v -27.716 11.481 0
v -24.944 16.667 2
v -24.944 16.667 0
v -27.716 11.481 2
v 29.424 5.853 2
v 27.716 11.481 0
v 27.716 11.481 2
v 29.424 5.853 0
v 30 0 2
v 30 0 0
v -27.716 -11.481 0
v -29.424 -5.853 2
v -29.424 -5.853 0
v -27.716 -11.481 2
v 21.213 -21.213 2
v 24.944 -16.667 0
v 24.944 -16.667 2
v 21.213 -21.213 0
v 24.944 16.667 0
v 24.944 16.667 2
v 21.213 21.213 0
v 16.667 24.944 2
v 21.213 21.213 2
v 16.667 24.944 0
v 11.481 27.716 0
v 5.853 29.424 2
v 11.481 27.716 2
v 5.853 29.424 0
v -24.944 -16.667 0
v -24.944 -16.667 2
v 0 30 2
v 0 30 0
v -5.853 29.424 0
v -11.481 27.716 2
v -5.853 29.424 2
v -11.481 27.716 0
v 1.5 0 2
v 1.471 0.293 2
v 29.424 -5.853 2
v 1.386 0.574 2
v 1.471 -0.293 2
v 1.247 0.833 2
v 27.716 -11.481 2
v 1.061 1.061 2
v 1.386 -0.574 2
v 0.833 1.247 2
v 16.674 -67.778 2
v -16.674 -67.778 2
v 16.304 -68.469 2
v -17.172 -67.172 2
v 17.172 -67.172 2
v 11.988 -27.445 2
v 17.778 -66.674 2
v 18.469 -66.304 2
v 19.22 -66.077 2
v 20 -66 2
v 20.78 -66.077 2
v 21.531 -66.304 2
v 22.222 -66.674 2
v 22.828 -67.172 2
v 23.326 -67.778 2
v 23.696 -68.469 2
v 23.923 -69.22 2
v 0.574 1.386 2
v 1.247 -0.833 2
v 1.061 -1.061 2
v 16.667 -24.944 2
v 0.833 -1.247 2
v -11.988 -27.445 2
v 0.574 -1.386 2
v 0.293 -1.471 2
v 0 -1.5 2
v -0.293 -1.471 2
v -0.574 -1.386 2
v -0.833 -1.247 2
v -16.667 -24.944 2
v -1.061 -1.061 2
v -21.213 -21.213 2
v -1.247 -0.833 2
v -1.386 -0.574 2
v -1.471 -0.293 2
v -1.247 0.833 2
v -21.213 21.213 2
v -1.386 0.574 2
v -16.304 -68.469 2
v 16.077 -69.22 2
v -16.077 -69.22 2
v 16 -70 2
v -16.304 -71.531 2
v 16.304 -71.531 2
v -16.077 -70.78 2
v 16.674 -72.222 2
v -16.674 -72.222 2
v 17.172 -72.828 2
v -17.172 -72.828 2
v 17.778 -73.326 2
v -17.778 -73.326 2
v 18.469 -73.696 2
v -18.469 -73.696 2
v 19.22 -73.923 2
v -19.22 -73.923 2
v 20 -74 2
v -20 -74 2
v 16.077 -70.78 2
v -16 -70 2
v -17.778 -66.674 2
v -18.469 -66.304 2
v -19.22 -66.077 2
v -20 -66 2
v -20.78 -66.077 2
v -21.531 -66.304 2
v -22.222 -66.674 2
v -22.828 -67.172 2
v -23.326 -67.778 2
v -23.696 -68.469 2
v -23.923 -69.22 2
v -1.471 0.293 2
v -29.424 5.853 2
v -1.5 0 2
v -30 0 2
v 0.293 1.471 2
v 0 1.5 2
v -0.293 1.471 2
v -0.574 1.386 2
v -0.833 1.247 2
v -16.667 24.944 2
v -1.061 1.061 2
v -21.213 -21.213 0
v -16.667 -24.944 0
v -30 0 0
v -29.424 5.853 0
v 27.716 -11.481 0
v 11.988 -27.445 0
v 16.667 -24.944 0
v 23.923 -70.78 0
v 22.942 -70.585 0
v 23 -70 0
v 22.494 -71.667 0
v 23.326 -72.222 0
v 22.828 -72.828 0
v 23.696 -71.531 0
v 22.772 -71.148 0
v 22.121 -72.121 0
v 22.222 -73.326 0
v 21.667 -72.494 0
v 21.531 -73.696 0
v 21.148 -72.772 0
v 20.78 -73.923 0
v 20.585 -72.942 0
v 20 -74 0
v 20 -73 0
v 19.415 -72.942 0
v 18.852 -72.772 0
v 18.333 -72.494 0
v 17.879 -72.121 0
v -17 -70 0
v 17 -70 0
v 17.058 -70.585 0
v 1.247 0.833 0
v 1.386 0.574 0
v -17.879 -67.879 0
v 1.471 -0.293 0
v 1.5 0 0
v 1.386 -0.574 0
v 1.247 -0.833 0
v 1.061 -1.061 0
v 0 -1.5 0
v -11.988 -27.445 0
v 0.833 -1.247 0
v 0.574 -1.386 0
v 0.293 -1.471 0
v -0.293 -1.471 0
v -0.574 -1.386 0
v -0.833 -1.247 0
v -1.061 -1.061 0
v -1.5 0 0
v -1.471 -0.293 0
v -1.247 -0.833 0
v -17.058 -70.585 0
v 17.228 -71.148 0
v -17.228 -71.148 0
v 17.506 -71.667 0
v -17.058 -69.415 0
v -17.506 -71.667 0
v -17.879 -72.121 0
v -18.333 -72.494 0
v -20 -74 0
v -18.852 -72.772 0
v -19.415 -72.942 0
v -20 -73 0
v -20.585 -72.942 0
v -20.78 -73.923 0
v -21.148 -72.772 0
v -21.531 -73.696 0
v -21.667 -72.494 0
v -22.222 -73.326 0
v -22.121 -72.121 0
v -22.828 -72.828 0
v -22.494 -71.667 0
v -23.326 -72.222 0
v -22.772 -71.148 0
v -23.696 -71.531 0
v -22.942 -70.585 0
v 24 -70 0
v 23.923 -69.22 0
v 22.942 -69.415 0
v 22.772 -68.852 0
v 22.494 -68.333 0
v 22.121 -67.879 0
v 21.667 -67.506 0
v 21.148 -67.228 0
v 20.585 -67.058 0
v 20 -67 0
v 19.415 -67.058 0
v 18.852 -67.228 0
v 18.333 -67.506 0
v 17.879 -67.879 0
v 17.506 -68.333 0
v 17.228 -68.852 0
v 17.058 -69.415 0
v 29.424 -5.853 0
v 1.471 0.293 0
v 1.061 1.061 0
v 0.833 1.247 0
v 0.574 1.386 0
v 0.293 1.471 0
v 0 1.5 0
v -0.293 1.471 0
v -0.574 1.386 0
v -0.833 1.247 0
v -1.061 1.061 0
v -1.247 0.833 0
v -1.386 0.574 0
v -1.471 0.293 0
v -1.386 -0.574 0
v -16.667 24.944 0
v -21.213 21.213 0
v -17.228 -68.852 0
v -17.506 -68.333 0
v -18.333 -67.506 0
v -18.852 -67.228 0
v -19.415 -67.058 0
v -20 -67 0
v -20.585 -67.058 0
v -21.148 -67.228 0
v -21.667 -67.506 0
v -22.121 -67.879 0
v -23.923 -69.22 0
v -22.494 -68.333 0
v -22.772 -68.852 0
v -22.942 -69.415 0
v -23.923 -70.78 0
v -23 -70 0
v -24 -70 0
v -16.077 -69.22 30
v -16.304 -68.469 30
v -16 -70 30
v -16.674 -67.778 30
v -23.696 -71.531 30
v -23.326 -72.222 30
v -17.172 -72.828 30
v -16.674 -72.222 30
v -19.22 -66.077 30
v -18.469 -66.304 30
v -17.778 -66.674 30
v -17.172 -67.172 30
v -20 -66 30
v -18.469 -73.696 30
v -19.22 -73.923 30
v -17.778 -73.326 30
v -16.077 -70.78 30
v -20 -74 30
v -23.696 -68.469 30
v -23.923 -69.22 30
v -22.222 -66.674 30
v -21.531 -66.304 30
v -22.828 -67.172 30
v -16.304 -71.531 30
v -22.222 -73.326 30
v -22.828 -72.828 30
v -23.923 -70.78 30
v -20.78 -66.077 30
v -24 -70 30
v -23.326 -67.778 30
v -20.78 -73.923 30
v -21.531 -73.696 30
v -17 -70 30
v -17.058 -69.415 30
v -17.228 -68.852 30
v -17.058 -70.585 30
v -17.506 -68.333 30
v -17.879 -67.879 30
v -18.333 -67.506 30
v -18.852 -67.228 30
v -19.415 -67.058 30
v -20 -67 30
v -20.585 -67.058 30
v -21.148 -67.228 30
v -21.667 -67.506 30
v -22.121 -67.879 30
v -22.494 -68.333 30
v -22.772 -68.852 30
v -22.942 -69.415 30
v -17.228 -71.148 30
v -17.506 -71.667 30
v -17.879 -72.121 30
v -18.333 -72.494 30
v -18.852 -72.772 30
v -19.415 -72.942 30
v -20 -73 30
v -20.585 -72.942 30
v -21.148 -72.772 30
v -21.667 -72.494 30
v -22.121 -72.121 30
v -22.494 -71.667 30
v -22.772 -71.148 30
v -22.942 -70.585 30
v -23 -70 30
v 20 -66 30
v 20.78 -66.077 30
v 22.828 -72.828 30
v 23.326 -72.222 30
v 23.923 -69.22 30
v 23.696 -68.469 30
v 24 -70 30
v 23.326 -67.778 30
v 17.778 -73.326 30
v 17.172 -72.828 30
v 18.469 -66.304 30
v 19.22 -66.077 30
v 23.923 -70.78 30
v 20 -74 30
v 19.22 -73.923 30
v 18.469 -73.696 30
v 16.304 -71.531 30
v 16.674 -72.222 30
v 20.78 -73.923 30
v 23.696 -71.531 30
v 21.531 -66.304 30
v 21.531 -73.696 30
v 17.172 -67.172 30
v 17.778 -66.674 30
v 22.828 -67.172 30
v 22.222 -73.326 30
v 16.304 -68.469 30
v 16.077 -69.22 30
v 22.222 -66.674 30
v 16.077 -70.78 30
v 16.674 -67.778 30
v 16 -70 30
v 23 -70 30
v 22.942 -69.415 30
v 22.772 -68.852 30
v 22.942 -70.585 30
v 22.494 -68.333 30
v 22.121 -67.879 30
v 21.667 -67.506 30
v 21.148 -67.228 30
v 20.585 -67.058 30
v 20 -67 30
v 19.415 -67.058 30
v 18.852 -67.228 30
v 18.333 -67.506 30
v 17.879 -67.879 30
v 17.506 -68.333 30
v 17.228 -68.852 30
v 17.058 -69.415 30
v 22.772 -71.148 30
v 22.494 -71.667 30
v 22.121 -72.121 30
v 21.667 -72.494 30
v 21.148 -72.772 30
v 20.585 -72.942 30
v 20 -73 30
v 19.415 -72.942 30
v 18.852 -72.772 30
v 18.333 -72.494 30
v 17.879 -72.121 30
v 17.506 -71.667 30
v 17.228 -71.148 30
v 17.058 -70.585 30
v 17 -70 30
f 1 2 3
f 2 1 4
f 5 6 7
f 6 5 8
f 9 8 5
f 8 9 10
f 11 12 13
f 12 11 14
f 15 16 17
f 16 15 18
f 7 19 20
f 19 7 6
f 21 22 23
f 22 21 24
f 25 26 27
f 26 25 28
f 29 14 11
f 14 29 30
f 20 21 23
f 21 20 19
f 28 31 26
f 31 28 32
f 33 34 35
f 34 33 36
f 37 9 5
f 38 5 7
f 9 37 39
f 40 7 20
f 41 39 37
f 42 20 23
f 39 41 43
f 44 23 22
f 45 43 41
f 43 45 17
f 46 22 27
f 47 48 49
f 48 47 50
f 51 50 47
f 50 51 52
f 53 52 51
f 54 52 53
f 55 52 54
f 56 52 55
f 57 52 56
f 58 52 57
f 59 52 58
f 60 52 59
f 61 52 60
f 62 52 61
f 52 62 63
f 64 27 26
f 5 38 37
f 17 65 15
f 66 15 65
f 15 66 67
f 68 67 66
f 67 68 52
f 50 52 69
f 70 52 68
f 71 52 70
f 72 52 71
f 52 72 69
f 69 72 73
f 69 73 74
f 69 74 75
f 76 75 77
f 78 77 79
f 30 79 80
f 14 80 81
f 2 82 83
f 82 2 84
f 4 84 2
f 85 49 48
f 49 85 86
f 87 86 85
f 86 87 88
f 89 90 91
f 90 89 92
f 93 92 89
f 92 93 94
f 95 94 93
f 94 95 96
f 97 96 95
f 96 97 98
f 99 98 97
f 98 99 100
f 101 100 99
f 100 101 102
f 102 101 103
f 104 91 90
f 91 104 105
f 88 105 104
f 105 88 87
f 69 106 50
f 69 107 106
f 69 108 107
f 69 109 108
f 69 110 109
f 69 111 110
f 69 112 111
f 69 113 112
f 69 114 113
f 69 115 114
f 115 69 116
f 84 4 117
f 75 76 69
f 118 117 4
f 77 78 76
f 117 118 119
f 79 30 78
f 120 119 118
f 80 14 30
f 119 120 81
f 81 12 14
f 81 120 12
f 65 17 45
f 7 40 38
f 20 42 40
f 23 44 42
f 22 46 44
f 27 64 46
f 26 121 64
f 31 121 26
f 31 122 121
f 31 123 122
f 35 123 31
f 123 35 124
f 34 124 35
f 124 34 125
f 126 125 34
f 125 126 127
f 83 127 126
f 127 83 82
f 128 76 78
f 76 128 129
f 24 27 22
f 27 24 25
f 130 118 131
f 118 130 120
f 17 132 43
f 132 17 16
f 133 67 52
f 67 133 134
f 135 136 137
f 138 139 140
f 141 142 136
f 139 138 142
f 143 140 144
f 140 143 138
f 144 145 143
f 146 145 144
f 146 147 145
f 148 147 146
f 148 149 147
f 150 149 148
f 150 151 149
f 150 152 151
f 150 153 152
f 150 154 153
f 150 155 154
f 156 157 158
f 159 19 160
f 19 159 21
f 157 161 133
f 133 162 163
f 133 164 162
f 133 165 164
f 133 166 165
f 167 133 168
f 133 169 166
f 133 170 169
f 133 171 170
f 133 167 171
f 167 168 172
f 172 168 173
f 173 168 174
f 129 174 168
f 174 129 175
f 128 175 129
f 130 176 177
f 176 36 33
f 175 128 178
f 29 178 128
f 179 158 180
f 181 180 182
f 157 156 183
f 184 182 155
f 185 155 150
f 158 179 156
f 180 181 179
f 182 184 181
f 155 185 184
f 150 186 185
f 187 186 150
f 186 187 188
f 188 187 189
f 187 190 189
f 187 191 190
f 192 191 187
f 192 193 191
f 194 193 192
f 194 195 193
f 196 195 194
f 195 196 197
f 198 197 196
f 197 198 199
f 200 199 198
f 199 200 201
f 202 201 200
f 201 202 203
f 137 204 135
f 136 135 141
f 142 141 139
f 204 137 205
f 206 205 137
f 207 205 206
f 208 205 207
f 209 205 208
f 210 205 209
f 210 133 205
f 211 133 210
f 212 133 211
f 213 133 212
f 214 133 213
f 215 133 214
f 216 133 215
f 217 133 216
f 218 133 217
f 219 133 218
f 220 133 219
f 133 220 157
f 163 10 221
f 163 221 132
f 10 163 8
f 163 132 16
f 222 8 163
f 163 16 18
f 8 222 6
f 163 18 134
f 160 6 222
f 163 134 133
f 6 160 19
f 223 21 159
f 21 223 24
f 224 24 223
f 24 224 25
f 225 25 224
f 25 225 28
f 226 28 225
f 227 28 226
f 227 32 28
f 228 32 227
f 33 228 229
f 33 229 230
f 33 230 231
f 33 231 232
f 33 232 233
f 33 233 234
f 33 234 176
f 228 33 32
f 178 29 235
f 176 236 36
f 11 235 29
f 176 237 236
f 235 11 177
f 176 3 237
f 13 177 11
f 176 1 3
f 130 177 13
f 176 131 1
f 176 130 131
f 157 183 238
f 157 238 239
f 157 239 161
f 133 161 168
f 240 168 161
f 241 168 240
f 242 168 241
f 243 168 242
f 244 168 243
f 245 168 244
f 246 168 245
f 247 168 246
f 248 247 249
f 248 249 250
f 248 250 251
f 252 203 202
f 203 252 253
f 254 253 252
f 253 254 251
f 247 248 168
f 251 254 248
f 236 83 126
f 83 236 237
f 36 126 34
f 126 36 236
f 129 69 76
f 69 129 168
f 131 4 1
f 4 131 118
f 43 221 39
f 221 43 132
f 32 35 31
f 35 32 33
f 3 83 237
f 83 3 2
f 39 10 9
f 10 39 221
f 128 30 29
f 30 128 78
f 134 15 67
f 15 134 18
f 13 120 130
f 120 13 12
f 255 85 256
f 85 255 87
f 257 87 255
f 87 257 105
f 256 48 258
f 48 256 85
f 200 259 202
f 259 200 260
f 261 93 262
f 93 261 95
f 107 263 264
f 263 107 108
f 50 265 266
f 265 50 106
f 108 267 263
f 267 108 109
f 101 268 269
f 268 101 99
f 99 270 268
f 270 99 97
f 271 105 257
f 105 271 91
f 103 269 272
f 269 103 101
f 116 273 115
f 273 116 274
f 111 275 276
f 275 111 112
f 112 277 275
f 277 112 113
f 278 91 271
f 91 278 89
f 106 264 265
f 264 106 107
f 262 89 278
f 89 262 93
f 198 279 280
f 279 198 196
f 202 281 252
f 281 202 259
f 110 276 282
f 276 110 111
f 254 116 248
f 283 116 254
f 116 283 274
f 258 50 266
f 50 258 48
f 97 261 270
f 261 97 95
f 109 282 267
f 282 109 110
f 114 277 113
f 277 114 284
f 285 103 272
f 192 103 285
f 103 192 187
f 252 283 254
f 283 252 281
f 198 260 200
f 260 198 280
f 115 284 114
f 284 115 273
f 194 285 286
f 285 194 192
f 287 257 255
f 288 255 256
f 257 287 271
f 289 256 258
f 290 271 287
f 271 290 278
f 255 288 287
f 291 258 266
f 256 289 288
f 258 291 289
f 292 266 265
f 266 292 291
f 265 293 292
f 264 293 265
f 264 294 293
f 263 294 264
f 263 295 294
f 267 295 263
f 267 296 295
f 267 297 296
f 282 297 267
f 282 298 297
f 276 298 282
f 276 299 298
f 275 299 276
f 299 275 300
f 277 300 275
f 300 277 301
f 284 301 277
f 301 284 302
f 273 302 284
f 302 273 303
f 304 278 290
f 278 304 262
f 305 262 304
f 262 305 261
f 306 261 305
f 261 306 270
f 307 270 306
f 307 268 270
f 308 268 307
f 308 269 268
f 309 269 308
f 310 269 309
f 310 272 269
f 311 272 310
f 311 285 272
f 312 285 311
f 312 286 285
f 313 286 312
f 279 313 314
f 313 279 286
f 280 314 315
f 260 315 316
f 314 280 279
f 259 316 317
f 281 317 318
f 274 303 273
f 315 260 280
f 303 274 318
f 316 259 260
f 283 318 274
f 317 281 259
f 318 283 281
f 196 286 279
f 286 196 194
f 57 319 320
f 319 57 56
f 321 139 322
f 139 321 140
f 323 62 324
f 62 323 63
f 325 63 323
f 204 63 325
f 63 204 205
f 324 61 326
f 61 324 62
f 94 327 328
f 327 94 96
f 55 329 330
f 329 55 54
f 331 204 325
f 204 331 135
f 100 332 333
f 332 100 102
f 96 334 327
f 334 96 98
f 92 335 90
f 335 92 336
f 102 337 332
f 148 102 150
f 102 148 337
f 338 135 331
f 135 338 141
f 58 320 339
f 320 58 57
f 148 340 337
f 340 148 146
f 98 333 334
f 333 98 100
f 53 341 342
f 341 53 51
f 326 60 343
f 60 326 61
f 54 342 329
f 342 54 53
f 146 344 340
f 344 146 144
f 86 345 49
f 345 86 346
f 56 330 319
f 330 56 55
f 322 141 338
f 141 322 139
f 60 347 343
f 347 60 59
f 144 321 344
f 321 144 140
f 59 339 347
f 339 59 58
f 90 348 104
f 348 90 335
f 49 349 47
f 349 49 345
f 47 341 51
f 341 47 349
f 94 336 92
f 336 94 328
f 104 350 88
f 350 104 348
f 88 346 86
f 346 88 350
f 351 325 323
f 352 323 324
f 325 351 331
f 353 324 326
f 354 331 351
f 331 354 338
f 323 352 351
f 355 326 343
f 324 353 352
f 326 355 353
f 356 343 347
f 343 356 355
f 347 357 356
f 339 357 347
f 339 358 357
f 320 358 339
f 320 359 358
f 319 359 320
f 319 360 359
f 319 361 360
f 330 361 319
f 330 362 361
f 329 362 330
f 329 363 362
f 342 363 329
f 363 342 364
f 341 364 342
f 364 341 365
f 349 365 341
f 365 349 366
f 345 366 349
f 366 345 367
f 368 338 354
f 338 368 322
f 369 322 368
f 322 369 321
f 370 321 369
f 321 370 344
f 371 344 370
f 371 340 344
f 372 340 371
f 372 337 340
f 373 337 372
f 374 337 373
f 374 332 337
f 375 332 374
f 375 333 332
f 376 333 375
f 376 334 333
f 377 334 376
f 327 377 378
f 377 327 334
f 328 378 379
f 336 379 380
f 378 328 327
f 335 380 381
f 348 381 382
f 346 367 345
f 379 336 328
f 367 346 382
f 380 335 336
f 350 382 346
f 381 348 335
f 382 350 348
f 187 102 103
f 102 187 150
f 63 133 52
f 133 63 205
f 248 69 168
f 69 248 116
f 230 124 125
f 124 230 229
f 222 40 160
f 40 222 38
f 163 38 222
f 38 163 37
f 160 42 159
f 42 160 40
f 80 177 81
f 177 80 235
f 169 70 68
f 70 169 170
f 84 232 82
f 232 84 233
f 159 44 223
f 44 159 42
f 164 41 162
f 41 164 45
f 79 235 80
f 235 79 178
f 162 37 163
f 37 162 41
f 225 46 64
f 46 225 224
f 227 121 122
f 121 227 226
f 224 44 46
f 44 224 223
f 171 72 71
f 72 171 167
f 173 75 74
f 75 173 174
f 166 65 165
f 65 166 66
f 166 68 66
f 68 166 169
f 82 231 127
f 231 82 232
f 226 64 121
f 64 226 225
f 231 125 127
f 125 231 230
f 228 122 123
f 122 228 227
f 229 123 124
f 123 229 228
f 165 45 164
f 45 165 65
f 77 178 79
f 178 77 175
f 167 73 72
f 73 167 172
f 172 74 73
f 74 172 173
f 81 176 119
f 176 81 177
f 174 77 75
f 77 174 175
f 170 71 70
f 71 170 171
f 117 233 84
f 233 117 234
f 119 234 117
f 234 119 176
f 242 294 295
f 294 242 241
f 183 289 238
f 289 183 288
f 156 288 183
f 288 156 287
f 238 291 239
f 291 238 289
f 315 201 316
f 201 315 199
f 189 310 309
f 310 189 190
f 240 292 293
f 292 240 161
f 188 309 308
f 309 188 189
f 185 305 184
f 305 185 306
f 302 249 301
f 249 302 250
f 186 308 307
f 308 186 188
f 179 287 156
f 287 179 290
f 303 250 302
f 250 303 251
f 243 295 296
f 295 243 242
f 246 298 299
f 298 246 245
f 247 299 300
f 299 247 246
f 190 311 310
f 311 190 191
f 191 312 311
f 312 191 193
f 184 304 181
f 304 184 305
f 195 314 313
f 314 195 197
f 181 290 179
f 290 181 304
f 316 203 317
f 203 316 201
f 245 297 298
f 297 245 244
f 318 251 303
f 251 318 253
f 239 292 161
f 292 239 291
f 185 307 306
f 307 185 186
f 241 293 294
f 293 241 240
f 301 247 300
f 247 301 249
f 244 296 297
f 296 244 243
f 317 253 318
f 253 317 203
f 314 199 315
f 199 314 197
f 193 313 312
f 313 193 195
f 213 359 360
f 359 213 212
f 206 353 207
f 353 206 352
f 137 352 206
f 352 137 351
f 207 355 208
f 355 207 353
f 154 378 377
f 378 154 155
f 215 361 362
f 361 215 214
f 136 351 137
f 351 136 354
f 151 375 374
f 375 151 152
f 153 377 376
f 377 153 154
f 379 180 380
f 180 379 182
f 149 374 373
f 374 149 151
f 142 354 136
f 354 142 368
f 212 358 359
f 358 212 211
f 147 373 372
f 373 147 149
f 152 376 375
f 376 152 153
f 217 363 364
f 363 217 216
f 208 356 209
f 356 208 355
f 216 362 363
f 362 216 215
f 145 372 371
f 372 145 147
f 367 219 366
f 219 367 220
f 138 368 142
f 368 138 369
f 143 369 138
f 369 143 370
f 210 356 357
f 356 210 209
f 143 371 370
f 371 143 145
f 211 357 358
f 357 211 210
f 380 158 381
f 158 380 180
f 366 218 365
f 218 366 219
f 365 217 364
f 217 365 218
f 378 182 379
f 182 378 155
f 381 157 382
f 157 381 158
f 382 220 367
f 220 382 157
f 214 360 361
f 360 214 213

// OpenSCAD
/**
 * Martin Egli
 * 2022-09-07
 * holder for MPU-9250 + Bluepill
 * to get some angle measurements
 */


module pcbMPU9250(loc_res = 32) {
    color("Blue") {
        difference() {
            translate([0, 0, 0])
            cube([26, 16, 1.5]);
            translate([3, 16-3, -1])
            cylinder(d = 3, h = 4.5, $fn = loc_res);
            translate([26-3, 16-3, -1])
            cylinder(d = 3, h = 4.5, $fn = loc_res);
        }
    }
    color("Black") {
        translate([26/2-2, 16/2-2, 1])
        cube([4, 4, 2]);
    }
}

module pcbMPU9250cut(loc_res = 32) {
    hull() {
        translate([3/2, 3/2, -3])
        cylinder(d = 3, h = 5, $fn = loc_res);
        translate([26-3/2, 3/2, -3])
        cylinder(d = 3, h = 5, $fn = loc_res);
    }
}

module pcbMPU9250mounts(loc_res = 32) {
    translate([3, 16-3, 0])
    cylinder(d = 2, h = 2, $fn = loc_res);
    translate([26-3, 16-3, 0])
    cylinder(d = 2, h = 2, $fn = loc_res);
}

module pcbBluePill(loc_res = 32) {
    color("Blue") {
        translate([0, 0, 0])
        cube([53, 22.5, 1.5]);
    }
    color("Black") {
        translate([21, 11, 1])
        rotate([0, 0, -45])
        cube([8, 8, 2]);
    }
    color("Silver") {
        translate([0, 7, 1.5])
        cube([6, 8, 2]);
        
        for(n = [0:1:20-1]) {
            translate([2.3+n*2.54, 3.3, -5])
            cylinder(d = 0.6, h = 8, $fn = loc_res);
            translate([2.3+n*2.54, 3.3+6*2.54, -5])
            cylinder(d = 0.6, h = 8, $fn = loc_res);
        }
    }
}

module pcbBluePill_header_holes(loc_res = 32) {
    for(n = [0:1:20-1]) {
        translate([2.3+n*2.54, 3.3, -5])
        cylinder(d = 1, h = 8, $fn = loc_res);
        translate([2.3+n*2.54, 3.3+6*2.54, -5])
        cylinder(d = 1, h = 8, $fn = loc_res);
    }
}
//cylinder(d = 75.5, h = 10, $fn = 256);

module place_pcbs() {
    translate([(53-26)/2, 25, 0])
    pcbMPU9250();
    pcbBluePill();
}

module pcbHolder(loc_res = 32, show_pcbs = 1) {
    difference() {
        union() {
            // needle
            hull() {
                translate([0, 0, -2])
                cylinder(d = 10, h = 2, $fn = loc_res);
                translate([0, +25, -2])
                cylinder(d = 0.1, h = 2, $fn = loc_res);
            }
            hull() {
                translate([0, 0, -2])
                cylinder(d = 10, h = 2, $fn = loc_res);
                translate([-15, -8, -2])
                cylinder(d = 2, h = 2, $fn = loc_res);
                translate([+15, -8, -2])
                cylinder(d = 2, h = 2, $fn = loc_res);
                translate([-28, -41, -2])
                cylinder(d = 2, h = 2, $fn = loc_res);
                translate([+28, -41, -2])
                cylinder(d = 2, h = 2, $fn = loc_res);
            }
            translate([-29, -43, -2])
            cube([29*2, 2, 28]);
            
            translate([-26/2, -25, 0])
            pcbMPU9250mounts();
        }
        // cut outs
        // center hole
        translate([0, 0, -10])
        cylinder(d = 3, h = 20, $fn = loc_res);
        
        translate([-26/2, -25, 0])
        pcbMPU9250cut();
        
        translate([-53/2, -40, 0])
        rotate([-90, 0, 0])
        translate([0, -26, 0])
        pcbBluePill_header_holes();
    }
    if(show_pcbs) {
        translate([-26/2, -25, 0])
        pcbMPU9250();
        translate([-53/2, -40, 0])
        rotate([-90, 0, 0])
        translate([0, -26, 0])
        pcbBluePill();
    }
}

module stand(loc_res = 32) {
    difference() {
        union() {
            translate([0, 0, 0])
            cylinder(d = 60, h = 2, $fn = loc_res);
            translate([-20, -70, 0])
            cylinder(d = 8, h = 30, $fn = loc_res);
            translate([+20, -70, 0])
            cylinder(d = 8, h = 30, $fn = loc_res);
            hull() {
                translate([0, 0, 0])
                cylinder(d = 8, h = 2, $fn = loc_res);
                translate([-20, -70, 0])
                cylinder(d = 8, h = 2, $fn = loc_res);
                translate([+20, -70, 0])
                cylinder(d = 8, h = 2, $fn = loc_res);
            }
        }
        // center hole
        translate([0, 0, -10])
        cylinder(d = 3, h = 20, $fn = loc_res);
        
        // hollow feets
        translate([-20, -70, -2])
        cylinder(d = 6, h = 30+4, $fn = loc_res);
        translate([+20, -70, -2])
        cylinder(d = 6, h = 30+4, $fn = loc_res);
    }
}

// middle axis in the center
/*translate([0, 0, -10])
cylinder(d = 3, h = 20, $fn = 32);
*/

translate([0, 0, 0])
//pcbHolder(32, 0);

//translate([0, 0, -6])
stand(32);
